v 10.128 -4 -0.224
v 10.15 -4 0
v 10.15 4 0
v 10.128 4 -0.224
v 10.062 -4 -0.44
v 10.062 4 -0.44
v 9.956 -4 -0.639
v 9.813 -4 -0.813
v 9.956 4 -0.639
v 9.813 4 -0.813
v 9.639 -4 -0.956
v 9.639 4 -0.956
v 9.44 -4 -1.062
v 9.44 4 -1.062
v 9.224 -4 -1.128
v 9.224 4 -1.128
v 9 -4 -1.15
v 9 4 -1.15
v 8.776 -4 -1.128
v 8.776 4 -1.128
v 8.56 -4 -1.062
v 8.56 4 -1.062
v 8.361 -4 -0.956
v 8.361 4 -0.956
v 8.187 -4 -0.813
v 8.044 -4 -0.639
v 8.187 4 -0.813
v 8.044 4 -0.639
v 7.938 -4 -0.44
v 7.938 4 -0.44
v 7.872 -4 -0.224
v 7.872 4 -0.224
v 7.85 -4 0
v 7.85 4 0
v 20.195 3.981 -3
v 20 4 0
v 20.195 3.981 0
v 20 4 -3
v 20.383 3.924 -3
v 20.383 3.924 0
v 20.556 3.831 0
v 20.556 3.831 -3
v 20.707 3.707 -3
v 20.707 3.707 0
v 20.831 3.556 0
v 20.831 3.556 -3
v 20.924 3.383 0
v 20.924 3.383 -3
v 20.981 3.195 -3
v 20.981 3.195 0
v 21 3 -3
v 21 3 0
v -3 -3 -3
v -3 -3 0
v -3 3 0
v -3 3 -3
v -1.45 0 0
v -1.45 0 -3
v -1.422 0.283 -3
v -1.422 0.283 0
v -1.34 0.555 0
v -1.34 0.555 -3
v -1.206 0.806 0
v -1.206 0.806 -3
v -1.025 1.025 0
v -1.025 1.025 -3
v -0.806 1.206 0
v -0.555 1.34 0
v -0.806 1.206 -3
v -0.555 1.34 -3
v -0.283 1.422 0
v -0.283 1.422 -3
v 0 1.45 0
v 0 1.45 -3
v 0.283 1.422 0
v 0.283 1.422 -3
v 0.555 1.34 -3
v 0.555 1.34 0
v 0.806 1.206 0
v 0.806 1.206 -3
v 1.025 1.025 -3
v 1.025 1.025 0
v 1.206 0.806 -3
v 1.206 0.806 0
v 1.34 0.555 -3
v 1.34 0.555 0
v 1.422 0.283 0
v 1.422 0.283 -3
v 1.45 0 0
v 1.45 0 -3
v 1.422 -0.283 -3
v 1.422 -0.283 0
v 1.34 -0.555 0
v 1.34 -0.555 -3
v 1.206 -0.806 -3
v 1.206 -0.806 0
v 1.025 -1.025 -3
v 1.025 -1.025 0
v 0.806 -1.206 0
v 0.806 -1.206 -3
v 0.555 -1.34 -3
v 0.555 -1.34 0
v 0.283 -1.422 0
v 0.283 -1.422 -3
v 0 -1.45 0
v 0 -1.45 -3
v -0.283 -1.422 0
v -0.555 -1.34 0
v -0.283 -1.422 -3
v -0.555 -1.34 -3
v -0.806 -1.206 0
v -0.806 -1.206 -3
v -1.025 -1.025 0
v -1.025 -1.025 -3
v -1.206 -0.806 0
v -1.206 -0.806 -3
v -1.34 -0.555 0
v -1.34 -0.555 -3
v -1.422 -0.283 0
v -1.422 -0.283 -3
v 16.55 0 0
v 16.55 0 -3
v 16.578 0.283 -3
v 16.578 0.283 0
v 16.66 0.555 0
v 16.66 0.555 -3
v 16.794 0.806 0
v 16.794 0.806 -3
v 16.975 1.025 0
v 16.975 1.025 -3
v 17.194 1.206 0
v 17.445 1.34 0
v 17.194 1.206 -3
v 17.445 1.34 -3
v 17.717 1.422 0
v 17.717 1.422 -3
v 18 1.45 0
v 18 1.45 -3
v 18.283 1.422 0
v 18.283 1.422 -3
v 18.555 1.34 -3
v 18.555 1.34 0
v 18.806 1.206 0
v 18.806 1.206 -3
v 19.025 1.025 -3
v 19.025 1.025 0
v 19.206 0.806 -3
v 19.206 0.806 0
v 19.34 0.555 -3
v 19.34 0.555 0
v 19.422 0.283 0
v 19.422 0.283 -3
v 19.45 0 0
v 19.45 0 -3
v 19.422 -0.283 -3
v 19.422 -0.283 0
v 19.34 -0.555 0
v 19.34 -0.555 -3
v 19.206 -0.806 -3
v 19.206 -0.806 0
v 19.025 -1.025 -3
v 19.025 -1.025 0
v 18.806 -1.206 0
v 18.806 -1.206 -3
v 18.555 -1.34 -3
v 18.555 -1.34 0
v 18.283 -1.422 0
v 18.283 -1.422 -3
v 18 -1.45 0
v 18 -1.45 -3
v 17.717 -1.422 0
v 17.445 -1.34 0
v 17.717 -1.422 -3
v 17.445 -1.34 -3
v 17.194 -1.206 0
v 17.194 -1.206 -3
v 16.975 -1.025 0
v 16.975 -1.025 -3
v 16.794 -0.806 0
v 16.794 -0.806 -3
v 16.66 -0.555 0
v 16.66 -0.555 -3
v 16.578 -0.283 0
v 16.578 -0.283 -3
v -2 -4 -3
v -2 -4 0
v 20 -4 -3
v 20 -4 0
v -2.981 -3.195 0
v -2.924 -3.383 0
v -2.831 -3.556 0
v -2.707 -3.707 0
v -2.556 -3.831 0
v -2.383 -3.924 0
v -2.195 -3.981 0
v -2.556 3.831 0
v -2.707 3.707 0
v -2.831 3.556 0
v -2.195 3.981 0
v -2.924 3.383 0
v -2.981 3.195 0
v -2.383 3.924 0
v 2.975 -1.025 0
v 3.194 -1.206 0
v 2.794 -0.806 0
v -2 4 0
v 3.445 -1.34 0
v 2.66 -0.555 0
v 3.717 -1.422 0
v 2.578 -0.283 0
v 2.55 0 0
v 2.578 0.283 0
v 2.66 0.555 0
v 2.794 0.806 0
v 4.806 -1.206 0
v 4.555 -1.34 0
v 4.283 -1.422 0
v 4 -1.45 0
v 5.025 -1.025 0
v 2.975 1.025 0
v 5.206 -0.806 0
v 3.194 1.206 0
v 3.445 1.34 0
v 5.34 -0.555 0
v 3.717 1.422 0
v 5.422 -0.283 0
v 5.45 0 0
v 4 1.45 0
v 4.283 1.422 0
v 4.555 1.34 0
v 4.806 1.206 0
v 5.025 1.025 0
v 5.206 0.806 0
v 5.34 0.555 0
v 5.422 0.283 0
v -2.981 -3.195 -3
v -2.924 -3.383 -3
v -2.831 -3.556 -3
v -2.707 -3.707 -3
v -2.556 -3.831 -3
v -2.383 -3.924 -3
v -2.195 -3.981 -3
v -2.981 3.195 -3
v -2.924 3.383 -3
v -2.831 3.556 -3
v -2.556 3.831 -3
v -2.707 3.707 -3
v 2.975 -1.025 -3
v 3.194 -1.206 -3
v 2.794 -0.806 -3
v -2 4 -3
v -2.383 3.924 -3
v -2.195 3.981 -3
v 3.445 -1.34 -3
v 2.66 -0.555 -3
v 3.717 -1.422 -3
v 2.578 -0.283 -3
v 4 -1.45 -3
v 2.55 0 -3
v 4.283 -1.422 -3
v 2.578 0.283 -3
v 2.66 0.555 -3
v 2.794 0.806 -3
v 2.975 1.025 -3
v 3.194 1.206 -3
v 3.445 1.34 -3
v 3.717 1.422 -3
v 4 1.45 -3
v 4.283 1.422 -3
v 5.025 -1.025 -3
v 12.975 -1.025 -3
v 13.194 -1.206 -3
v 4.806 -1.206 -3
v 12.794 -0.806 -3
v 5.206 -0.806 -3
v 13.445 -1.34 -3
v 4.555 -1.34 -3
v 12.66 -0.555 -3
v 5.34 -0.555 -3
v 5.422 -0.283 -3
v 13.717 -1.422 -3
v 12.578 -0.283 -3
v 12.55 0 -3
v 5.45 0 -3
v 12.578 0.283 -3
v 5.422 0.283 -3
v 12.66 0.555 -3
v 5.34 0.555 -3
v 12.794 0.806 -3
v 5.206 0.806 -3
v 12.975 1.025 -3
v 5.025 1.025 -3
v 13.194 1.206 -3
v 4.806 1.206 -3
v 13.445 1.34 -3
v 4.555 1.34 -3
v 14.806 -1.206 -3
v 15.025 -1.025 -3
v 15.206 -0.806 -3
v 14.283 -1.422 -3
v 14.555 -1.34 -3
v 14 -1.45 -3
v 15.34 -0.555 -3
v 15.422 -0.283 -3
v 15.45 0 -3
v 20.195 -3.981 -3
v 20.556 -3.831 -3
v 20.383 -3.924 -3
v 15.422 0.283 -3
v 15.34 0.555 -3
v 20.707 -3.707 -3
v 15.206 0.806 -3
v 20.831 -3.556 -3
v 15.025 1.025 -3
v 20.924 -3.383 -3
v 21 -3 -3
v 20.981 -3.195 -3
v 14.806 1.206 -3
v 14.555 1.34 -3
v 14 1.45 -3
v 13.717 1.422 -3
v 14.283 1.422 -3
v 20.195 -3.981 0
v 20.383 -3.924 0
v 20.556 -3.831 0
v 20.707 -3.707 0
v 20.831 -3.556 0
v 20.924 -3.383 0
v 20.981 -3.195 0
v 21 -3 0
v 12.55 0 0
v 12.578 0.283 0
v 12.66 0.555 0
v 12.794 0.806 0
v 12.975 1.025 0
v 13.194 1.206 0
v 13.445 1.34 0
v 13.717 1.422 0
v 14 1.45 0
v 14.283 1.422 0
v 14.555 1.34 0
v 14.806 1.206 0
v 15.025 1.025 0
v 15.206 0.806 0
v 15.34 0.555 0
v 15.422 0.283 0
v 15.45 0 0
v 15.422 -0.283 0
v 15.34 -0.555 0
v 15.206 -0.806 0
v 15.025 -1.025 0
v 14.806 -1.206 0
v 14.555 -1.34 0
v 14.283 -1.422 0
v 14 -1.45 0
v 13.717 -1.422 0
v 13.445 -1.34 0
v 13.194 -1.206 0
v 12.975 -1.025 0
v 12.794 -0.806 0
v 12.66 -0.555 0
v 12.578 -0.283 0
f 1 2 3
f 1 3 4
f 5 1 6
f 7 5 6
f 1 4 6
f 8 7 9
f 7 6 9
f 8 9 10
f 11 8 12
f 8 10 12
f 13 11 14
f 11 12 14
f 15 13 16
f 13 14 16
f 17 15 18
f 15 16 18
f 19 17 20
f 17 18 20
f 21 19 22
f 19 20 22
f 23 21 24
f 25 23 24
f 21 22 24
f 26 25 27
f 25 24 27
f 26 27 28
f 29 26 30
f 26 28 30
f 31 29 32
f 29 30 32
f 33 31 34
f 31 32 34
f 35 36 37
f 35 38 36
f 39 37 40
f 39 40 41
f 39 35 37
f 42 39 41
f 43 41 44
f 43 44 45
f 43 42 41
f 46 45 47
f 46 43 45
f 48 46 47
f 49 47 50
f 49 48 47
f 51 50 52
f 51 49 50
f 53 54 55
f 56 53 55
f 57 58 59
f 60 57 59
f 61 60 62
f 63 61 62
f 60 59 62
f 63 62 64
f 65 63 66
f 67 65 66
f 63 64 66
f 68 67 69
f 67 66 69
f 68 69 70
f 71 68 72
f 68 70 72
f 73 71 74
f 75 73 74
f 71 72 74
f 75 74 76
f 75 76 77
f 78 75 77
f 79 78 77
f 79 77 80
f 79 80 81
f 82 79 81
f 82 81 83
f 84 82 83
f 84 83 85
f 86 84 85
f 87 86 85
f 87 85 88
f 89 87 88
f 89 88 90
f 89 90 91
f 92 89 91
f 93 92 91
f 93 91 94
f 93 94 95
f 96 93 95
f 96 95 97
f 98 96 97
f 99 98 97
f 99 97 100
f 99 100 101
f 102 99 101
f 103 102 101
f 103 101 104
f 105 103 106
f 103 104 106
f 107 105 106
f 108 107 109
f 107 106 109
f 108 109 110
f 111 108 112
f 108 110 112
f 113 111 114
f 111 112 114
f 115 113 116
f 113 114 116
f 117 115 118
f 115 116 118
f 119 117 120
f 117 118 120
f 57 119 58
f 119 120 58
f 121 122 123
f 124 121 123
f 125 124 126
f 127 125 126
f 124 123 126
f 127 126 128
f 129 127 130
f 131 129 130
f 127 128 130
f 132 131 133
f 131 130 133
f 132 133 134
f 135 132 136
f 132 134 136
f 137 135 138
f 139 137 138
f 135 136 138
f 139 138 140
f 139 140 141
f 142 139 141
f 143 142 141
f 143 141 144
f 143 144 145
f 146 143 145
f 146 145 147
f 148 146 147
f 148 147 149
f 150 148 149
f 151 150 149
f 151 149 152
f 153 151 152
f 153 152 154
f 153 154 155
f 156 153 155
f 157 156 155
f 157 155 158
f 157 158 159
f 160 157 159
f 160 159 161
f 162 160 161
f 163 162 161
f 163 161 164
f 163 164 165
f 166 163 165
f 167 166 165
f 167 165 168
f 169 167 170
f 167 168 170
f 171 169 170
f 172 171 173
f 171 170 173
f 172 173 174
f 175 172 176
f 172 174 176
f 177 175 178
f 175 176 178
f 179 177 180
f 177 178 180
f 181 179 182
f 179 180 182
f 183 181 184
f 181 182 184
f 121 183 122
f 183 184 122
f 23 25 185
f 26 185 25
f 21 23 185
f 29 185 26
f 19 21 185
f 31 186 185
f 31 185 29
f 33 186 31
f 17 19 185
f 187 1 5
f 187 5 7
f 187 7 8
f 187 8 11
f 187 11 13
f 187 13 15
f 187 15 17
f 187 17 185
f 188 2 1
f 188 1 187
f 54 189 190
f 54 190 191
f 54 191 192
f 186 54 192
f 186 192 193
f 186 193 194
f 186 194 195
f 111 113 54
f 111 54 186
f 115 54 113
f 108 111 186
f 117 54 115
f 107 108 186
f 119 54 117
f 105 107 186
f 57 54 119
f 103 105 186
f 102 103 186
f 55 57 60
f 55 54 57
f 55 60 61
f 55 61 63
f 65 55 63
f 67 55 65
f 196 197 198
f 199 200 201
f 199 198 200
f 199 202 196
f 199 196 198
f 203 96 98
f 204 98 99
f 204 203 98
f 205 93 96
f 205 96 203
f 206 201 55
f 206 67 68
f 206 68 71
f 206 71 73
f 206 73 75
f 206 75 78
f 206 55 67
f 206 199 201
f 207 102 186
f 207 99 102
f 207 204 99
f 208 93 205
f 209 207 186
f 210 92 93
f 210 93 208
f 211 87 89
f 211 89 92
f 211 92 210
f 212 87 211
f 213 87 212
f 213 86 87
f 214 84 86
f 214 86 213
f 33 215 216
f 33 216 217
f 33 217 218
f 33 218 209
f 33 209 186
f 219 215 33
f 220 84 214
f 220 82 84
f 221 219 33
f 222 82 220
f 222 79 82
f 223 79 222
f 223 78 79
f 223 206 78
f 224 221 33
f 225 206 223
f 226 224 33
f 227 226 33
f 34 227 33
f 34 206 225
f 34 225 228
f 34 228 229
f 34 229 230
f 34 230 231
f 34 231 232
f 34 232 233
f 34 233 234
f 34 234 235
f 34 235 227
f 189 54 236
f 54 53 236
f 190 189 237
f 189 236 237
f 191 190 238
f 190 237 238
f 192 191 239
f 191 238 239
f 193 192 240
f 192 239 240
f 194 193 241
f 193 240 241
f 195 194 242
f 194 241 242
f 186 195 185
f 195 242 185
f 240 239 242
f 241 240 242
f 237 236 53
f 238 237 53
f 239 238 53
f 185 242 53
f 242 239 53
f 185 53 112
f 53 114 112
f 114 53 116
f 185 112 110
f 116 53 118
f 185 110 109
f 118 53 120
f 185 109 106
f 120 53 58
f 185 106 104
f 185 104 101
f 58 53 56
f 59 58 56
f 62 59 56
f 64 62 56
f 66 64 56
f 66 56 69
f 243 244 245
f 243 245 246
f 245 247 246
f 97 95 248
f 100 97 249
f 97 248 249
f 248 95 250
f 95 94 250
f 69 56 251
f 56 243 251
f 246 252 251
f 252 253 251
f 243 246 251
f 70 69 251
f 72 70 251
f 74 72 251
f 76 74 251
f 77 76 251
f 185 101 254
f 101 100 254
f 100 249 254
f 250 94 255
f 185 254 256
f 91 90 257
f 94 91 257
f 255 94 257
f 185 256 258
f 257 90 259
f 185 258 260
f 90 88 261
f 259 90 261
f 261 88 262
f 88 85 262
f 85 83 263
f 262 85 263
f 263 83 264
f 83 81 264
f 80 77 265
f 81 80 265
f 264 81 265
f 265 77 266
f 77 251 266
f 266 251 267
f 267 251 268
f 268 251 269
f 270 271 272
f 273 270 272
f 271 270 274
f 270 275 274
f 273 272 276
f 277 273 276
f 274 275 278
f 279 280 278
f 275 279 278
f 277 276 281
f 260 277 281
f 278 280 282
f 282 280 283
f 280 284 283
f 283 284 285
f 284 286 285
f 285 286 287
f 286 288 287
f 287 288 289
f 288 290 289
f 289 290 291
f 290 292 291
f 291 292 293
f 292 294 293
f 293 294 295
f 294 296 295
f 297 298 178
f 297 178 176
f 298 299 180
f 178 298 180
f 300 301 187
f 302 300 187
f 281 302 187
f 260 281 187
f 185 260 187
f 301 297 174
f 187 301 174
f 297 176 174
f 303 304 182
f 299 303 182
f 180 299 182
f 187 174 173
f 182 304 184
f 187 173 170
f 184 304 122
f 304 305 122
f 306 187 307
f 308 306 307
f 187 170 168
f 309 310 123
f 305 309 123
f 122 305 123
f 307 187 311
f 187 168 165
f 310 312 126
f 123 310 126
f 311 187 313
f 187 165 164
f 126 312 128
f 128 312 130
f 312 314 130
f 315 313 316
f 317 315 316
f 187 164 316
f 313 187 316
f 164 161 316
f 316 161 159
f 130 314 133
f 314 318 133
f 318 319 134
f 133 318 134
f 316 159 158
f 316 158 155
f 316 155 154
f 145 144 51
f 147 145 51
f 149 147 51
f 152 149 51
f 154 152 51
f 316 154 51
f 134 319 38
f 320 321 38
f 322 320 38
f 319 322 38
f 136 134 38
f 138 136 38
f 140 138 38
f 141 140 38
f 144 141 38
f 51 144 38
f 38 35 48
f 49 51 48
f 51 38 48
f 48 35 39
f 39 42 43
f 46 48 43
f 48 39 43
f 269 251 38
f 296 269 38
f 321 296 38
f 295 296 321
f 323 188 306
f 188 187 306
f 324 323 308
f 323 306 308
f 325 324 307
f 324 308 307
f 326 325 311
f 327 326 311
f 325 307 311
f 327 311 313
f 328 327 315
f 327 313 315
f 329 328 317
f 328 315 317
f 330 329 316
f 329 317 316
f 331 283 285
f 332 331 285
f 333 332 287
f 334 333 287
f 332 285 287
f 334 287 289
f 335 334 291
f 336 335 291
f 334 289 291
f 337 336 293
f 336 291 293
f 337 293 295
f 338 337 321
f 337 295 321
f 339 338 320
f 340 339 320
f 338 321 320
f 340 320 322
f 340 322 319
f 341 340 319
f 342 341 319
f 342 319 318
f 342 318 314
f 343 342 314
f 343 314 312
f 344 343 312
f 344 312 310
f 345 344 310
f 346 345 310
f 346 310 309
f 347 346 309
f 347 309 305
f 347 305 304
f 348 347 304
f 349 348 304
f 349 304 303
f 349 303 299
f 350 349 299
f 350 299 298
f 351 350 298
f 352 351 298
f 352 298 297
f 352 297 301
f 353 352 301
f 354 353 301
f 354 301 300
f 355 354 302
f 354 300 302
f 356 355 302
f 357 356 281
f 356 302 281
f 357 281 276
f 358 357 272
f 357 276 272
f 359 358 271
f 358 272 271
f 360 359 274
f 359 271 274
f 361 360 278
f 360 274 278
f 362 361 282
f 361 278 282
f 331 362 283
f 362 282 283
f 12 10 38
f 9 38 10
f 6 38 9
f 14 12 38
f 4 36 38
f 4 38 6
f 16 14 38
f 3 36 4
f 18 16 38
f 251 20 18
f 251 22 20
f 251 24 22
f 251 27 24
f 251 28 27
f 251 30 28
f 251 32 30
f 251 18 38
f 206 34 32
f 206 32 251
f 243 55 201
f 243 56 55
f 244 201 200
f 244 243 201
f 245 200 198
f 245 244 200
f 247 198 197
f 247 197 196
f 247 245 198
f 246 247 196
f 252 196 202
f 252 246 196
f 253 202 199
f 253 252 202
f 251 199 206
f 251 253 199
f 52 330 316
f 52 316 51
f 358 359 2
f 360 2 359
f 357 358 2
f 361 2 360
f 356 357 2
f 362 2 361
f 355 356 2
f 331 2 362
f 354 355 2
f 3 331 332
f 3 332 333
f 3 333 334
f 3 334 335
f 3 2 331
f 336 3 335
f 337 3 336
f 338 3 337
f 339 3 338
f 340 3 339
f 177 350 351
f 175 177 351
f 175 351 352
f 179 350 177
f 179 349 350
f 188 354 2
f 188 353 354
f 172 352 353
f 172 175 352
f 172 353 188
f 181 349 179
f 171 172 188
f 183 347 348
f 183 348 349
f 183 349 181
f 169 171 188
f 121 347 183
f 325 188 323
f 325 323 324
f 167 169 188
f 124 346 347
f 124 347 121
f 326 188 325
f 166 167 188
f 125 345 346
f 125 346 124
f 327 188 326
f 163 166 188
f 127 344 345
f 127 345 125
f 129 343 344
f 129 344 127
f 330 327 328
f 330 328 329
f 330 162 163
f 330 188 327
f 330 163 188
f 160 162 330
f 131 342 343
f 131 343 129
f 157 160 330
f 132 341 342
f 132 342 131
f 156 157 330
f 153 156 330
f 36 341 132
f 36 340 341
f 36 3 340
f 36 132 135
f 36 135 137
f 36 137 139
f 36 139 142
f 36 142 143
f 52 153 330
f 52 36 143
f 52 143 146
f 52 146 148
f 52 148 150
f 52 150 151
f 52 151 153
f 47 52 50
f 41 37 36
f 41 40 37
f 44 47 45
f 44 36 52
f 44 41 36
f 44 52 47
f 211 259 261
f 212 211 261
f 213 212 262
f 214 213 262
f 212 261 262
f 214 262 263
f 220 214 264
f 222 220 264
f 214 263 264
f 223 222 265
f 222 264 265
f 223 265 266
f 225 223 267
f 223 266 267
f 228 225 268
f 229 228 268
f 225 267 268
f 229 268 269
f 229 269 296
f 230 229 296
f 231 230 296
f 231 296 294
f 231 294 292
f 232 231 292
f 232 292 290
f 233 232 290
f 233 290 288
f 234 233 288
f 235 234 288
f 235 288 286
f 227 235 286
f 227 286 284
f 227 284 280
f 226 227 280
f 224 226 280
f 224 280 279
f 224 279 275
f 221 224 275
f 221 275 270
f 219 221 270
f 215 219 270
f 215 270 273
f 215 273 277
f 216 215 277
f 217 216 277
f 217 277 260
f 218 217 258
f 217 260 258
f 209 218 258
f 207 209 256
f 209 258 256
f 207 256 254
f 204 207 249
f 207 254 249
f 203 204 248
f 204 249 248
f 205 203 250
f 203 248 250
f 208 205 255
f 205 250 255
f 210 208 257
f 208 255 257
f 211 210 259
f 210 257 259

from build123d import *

# Parameters (mm, degrees)
F0_W     = 6
F0_H     = 8
F0_W_2   = 12
F1_DEPTH = 3
F2_D     = 2.9
F4_D     = 2.3
F5_R     = 1


with BuildPart() as f1:
    # F0 (on Top) → F1 (new body)
    with BuildSketch(Plane.XY):
        Rectangle(F0_W, F0_H)
        with Locations((9, 0)):
            Rectangle(F0_W_2, F0_H)
        with Locations((18, 0)):
            Rectangle(F0_W, F0_H)
    extrude(amount=-F1_DEPTH)

    # F2 (through all)
    with Locations(Plane.XY):
        with Locations((0, 0), (4, 0), (14, 0), (18, 0)):
            Hole(F2_D / 2)

    # F4 (through all)
    with Locations(Plane.XZ.offset(4)):
        with Locations((9, 0)):
            Hole(F4_D / 2)

    # F5
    f5_edges = [f1.edges().sort_by_distance(p)[0] for p in [
        (-3, -4, -1.5),
        (21, -4, -1.5),
        (21, 4, -1.5),
        (-3, 4, -1.5),
    ]]
    fillet(f5_edges, radius=F5_R)


solid = f1.part
